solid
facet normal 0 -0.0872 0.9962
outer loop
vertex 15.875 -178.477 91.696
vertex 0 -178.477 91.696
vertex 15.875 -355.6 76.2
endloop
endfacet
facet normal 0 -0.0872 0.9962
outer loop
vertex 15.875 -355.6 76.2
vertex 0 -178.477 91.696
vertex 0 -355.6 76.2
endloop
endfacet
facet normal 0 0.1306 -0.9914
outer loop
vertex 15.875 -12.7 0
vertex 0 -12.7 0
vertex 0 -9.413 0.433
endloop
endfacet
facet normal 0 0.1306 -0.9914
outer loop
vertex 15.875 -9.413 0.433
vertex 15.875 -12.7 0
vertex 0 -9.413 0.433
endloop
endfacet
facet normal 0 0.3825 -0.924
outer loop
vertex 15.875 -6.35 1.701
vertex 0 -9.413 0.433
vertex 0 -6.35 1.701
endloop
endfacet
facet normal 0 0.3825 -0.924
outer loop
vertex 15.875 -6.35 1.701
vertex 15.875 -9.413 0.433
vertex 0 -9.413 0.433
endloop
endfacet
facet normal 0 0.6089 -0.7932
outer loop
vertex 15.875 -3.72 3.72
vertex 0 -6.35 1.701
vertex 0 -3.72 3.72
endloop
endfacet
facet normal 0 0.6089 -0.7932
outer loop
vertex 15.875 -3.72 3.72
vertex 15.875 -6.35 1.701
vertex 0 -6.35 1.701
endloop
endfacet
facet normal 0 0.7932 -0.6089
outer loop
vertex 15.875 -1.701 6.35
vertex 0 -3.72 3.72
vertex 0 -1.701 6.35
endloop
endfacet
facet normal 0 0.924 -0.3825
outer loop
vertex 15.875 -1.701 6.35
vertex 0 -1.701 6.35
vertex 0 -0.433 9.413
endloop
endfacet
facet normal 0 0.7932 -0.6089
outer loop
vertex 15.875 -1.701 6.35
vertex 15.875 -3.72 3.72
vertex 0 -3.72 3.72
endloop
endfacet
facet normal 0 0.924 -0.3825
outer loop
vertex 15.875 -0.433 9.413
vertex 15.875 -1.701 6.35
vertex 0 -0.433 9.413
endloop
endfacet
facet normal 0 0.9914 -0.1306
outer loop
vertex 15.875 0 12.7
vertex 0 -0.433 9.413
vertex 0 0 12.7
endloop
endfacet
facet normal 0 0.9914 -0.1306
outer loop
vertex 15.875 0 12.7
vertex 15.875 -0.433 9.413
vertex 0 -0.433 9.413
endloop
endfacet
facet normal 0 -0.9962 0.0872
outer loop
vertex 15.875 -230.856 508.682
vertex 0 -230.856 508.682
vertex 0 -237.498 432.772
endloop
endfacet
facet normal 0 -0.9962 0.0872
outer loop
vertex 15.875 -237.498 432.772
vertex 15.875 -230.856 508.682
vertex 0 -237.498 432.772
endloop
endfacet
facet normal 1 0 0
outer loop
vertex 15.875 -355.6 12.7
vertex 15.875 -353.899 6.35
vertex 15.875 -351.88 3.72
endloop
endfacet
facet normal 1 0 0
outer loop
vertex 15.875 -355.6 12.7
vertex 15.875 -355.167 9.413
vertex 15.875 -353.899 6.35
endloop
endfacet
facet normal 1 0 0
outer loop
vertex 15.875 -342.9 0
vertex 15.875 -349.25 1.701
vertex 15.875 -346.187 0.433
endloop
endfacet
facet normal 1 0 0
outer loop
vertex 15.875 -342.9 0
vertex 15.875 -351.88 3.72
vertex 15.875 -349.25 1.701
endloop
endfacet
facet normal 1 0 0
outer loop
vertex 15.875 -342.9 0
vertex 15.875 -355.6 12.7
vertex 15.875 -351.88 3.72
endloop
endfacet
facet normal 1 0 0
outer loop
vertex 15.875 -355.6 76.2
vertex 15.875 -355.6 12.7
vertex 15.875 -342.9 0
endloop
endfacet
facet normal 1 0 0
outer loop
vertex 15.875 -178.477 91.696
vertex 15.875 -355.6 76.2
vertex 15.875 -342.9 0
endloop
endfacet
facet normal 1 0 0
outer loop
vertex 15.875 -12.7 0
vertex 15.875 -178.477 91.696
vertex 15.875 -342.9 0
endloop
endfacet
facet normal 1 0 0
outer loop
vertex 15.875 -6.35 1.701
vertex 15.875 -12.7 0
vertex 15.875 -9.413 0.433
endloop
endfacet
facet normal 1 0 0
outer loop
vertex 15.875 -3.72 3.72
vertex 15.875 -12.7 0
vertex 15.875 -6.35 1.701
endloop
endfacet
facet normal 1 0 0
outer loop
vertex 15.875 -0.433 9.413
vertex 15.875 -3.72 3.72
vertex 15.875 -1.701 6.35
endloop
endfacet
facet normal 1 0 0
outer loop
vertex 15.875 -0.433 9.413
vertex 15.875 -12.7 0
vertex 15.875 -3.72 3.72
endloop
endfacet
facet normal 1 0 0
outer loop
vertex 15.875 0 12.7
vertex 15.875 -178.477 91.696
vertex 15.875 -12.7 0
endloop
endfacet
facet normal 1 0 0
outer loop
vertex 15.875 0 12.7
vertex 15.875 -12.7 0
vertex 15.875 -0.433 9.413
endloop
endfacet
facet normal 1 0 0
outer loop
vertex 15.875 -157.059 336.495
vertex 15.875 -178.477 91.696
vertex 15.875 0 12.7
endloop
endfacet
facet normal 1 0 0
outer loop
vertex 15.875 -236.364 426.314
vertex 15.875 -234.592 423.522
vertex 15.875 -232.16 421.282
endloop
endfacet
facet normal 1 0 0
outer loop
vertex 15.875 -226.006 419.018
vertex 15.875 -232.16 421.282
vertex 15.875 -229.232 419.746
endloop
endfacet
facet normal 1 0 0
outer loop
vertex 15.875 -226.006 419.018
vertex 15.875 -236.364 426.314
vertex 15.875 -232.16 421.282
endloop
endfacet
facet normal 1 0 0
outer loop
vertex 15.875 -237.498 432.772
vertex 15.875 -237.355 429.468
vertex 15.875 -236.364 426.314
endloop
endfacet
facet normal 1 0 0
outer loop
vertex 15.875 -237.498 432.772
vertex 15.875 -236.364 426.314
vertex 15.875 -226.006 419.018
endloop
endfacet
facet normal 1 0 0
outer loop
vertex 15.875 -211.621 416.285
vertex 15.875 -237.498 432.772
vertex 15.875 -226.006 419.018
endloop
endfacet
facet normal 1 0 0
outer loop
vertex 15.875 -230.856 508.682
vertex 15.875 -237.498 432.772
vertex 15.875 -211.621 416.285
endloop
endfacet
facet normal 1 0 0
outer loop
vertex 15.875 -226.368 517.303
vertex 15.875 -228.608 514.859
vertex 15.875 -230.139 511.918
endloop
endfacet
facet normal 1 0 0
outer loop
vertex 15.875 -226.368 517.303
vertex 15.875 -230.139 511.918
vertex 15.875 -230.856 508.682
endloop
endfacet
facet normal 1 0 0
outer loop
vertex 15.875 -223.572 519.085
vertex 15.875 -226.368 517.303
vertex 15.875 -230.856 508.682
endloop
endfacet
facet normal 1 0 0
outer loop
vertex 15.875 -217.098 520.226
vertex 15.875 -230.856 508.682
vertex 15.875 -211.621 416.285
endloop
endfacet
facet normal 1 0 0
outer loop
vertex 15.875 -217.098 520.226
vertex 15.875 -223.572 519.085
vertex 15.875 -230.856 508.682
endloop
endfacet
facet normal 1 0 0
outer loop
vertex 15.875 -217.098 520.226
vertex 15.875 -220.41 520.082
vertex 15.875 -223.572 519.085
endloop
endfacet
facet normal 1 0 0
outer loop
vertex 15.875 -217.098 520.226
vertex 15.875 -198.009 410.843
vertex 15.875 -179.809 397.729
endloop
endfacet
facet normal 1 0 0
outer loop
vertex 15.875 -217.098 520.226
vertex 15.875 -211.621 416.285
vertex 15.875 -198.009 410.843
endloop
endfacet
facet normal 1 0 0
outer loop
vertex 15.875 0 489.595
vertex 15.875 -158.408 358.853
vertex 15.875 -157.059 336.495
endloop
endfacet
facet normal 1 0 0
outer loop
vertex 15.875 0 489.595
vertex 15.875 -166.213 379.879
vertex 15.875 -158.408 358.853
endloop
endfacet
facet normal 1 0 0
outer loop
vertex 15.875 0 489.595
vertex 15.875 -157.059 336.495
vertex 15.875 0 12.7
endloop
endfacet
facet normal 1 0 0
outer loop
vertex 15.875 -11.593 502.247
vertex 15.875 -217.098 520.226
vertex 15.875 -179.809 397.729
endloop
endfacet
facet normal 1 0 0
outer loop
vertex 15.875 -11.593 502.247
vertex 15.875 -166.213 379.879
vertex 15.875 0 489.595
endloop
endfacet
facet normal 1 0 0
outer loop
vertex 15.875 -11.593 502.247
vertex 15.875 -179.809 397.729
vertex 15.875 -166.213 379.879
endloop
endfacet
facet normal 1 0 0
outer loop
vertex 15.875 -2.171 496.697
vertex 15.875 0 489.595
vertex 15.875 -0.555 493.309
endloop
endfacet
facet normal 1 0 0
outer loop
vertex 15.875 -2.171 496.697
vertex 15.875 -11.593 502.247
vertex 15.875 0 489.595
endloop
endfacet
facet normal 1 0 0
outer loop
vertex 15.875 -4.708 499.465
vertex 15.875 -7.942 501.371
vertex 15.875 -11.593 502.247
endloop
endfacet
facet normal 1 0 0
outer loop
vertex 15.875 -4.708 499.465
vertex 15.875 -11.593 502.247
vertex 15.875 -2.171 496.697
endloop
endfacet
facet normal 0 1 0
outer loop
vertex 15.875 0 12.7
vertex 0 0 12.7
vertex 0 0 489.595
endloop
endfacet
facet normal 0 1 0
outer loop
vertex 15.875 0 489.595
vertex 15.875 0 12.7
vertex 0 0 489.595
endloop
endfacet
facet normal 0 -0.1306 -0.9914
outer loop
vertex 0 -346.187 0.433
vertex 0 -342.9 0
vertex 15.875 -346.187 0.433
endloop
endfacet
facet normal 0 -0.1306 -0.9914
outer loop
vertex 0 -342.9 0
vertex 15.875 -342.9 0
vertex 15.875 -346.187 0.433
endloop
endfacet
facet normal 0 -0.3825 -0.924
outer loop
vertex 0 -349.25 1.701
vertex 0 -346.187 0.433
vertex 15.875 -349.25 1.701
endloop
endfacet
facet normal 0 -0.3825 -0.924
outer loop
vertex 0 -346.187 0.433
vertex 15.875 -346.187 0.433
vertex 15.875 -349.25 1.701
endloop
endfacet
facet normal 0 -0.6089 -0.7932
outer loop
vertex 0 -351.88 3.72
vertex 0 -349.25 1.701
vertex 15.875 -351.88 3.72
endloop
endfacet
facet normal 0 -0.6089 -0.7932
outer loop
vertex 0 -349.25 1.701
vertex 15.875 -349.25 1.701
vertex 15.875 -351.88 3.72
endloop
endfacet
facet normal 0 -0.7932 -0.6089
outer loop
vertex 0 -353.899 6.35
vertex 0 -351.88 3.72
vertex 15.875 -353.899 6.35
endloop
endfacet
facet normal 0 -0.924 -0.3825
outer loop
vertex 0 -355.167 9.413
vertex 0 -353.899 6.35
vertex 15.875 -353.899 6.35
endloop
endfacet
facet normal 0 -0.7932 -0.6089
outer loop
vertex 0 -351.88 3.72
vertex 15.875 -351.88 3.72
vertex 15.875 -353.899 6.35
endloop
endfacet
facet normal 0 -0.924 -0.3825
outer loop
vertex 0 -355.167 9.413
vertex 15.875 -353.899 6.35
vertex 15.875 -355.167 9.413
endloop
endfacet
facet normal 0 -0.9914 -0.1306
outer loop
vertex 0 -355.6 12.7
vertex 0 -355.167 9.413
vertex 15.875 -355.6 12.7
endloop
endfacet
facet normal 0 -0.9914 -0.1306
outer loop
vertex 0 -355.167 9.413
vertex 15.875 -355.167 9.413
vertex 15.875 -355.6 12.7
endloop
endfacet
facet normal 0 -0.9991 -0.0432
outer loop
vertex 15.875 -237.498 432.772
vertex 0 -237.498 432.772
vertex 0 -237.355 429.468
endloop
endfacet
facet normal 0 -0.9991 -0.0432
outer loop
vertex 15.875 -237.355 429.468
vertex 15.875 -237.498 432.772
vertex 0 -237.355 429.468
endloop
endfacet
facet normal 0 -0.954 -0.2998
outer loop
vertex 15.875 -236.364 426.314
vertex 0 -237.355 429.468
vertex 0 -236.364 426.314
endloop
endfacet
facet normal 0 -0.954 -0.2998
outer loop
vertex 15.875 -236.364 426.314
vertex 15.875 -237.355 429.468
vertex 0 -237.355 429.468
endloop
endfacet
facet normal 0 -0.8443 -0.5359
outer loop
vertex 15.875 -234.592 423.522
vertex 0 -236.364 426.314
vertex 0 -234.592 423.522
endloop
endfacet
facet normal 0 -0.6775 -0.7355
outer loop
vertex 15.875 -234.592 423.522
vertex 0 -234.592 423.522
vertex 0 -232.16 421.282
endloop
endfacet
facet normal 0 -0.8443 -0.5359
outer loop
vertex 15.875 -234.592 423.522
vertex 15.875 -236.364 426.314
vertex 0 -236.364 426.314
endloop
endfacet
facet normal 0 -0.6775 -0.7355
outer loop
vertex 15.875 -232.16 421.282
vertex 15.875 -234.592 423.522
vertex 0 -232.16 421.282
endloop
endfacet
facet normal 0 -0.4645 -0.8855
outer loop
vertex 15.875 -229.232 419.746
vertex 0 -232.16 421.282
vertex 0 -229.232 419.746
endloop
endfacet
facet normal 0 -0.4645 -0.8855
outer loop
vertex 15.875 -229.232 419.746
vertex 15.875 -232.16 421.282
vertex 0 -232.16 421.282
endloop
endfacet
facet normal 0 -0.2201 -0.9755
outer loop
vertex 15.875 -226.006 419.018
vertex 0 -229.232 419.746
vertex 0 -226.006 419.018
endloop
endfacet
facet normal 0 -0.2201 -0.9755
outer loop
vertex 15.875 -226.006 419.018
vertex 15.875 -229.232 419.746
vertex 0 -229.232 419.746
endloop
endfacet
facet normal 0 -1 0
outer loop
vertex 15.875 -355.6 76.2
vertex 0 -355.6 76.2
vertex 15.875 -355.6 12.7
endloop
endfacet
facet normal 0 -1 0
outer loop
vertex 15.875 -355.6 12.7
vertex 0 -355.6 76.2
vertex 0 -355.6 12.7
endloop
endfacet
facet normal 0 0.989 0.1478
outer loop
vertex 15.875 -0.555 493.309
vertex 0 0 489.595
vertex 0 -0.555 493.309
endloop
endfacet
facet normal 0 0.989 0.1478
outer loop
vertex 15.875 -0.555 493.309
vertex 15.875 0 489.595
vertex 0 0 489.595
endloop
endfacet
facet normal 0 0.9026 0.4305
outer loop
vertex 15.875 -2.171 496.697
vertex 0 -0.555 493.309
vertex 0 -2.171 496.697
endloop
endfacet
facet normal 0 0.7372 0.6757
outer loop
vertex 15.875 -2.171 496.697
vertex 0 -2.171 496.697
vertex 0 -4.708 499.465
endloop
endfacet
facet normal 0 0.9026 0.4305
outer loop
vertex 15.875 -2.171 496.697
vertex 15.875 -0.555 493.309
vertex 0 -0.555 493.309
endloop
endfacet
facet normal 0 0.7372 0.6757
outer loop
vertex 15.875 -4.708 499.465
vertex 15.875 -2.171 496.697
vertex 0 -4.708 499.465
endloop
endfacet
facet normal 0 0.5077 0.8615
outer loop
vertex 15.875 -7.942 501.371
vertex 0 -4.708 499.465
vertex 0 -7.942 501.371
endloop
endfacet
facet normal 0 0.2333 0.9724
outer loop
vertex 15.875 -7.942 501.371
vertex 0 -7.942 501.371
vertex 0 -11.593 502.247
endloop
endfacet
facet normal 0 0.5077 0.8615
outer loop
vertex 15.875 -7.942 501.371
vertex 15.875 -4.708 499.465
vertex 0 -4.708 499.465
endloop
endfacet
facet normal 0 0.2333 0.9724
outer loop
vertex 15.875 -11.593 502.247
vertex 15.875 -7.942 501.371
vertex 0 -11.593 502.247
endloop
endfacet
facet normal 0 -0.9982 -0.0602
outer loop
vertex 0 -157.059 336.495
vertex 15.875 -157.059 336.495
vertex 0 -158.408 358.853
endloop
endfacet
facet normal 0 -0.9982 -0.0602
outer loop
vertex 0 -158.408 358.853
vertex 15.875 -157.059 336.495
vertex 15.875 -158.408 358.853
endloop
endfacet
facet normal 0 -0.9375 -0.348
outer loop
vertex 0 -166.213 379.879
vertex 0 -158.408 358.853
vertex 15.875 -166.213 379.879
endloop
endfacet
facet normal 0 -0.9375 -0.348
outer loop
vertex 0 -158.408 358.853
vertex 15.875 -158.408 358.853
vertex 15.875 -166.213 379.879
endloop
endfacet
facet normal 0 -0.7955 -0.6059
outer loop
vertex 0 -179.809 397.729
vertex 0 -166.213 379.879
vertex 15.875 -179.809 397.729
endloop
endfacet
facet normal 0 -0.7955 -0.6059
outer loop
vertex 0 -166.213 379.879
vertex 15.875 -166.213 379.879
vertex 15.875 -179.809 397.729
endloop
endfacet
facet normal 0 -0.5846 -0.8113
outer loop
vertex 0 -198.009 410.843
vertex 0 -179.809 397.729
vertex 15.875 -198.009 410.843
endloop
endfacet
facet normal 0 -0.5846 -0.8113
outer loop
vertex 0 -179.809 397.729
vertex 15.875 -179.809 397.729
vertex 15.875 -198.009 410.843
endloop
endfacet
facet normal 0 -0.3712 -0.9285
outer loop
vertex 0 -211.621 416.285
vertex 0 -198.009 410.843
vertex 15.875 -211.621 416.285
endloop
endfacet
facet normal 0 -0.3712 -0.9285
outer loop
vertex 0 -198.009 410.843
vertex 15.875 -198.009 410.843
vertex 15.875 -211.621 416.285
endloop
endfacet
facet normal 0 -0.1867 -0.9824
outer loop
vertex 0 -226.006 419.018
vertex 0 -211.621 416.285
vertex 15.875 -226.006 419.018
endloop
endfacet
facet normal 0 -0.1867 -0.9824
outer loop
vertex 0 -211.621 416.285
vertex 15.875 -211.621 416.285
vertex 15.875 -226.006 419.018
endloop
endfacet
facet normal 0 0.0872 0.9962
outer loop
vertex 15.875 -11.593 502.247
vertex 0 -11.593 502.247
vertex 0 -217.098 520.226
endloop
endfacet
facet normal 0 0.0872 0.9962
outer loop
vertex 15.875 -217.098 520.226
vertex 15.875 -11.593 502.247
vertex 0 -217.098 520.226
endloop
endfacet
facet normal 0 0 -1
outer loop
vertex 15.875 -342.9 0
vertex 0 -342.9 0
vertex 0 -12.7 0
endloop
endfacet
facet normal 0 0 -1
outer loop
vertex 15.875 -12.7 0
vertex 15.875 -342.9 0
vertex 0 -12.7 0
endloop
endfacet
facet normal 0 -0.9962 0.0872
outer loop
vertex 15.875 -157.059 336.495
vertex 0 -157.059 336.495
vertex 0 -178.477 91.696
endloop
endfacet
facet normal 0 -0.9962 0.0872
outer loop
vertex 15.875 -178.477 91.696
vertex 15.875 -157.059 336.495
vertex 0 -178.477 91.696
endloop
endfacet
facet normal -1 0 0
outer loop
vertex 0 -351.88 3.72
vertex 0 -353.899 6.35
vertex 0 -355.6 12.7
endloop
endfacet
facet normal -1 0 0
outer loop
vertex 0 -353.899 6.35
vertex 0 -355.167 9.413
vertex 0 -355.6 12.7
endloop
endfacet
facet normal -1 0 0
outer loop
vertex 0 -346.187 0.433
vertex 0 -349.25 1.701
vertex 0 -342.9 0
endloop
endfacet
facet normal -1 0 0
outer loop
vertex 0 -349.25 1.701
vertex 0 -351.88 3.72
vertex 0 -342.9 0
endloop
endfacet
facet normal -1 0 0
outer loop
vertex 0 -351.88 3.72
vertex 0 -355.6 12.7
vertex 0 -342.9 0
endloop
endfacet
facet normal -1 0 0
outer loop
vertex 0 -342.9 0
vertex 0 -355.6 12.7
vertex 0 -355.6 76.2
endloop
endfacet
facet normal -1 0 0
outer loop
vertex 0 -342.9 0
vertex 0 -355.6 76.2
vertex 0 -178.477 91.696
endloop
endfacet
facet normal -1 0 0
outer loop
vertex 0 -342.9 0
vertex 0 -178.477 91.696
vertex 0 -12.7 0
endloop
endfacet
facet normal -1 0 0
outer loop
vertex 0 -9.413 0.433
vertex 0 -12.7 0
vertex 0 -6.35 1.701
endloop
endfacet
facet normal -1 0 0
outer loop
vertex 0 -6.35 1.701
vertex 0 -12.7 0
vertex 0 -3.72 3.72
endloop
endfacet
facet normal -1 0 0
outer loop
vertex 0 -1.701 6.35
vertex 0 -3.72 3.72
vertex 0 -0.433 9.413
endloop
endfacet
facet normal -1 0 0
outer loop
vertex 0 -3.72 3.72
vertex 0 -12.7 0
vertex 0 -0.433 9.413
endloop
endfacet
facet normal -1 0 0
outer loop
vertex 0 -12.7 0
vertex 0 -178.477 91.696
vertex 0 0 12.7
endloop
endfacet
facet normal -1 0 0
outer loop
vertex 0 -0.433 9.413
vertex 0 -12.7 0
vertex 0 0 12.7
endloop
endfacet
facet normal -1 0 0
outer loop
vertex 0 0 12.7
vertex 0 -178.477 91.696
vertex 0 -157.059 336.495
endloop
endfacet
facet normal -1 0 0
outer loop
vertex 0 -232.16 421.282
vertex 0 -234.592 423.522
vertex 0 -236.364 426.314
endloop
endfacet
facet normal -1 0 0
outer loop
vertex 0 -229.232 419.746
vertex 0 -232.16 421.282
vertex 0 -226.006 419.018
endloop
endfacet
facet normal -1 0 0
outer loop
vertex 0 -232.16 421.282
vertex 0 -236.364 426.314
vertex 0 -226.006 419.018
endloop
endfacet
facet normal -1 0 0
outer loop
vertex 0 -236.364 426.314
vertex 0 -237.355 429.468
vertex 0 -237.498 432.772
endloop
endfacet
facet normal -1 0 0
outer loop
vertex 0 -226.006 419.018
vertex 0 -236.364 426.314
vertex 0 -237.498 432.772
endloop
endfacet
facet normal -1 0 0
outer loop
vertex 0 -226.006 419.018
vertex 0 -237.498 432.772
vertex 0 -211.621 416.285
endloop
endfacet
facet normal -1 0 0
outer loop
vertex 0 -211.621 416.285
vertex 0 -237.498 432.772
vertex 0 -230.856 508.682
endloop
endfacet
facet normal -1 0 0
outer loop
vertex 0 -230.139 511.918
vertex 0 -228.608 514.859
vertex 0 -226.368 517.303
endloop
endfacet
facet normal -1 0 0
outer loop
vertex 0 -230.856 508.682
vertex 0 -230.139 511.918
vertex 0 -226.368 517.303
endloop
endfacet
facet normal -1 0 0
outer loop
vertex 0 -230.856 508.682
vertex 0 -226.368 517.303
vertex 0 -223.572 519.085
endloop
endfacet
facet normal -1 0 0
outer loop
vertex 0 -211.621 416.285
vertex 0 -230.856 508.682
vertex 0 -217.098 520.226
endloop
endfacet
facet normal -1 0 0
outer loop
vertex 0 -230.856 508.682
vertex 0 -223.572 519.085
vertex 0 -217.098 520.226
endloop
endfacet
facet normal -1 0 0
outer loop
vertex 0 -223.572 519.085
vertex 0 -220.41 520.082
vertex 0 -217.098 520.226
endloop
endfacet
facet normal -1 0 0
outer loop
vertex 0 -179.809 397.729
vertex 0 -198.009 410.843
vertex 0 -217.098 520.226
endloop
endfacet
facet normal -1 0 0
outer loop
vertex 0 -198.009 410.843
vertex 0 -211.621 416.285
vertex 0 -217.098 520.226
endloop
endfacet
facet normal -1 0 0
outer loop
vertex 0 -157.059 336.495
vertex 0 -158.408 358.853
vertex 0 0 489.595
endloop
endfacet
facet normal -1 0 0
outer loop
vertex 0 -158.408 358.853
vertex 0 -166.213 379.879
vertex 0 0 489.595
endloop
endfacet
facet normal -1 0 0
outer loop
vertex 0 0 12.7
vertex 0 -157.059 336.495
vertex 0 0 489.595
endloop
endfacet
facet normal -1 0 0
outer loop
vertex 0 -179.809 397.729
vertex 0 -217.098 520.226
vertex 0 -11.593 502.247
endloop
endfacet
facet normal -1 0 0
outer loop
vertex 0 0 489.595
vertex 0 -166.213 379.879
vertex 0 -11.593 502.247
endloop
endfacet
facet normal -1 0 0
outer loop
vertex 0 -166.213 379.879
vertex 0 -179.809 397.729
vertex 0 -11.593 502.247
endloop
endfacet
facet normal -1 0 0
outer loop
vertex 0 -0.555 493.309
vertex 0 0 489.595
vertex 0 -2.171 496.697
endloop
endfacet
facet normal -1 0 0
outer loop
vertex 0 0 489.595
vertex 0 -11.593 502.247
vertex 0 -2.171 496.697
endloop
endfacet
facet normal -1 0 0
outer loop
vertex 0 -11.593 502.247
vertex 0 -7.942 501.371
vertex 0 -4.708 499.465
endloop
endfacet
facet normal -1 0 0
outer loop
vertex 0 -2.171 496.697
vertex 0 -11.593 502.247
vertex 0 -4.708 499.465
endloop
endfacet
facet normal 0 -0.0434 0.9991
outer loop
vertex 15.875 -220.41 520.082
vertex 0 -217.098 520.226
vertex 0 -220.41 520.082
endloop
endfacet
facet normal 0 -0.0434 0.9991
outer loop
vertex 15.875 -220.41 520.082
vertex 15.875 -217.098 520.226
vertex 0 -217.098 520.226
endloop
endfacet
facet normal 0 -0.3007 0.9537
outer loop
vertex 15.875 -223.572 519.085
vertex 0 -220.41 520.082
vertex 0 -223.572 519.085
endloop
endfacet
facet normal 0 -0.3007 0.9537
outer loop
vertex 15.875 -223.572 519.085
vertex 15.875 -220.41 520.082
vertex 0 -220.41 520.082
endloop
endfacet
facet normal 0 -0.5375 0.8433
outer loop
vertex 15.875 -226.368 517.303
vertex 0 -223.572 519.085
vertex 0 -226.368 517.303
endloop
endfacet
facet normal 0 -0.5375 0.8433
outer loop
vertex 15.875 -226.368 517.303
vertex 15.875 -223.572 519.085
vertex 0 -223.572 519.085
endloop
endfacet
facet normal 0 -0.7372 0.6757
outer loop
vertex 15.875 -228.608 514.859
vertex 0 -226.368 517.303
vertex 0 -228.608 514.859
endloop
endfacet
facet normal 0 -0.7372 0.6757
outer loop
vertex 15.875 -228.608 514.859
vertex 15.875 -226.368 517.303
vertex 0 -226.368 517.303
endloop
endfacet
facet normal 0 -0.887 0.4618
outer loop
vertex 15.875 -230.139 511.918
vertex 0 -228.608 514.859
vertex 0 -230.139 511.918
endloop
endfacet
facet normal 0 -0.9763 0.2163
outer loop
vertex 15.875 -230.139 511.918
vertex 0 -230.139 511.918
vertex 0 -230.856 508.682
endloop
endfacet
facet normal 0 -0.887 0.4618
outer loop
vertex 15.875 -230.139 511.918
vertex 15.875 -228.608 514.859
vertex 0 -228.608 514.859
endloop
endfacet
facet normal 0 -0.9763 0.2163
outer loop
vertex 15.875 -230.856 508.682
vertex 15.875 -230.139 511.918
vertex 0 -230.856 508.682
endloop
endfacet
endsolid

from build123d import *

# Parameters (mm, degrees)
F1_DEPTH = 15.875
F2_R     = 12.7
F3_R     = 76.2


with BuildPart() as f1:
    # F0 (on Right) → F1 (new body)
    with BuildSketch(Plane.YZ):
        Polygon((-355.6, 0), (0, 0), (0, 501.232803), (-229.74942, 521.333272), (-238.604443, 420.119891), (-150.418242, 412.404598), (-178.476583, 91.696291), (-355.6, 76.2), align=None)
    extrude(amount=F1_DEPTH)

    # F2
    f2_edges = [f1.edges().sort_by_distance(p)[0] for p in [
        (7.9375, -355.6, 0),
        (7.9375, 0, 0),
        (7.9375, 0, 501.232803),
        (7.9375, -238.604443, 420.119891),
        (7.9375, -229.74942, 521.333272),
    ]]
    fillet(f2_edges, radius=F2_R)

    # F3
    f3_edges = [f1.edges().sort_by_distance(p)[0] for p in [
        (7.9375, -150.418242, 412.404598),
    ]]
    fillet(f3_edges, radius=F3_R)


solid = f1.part
